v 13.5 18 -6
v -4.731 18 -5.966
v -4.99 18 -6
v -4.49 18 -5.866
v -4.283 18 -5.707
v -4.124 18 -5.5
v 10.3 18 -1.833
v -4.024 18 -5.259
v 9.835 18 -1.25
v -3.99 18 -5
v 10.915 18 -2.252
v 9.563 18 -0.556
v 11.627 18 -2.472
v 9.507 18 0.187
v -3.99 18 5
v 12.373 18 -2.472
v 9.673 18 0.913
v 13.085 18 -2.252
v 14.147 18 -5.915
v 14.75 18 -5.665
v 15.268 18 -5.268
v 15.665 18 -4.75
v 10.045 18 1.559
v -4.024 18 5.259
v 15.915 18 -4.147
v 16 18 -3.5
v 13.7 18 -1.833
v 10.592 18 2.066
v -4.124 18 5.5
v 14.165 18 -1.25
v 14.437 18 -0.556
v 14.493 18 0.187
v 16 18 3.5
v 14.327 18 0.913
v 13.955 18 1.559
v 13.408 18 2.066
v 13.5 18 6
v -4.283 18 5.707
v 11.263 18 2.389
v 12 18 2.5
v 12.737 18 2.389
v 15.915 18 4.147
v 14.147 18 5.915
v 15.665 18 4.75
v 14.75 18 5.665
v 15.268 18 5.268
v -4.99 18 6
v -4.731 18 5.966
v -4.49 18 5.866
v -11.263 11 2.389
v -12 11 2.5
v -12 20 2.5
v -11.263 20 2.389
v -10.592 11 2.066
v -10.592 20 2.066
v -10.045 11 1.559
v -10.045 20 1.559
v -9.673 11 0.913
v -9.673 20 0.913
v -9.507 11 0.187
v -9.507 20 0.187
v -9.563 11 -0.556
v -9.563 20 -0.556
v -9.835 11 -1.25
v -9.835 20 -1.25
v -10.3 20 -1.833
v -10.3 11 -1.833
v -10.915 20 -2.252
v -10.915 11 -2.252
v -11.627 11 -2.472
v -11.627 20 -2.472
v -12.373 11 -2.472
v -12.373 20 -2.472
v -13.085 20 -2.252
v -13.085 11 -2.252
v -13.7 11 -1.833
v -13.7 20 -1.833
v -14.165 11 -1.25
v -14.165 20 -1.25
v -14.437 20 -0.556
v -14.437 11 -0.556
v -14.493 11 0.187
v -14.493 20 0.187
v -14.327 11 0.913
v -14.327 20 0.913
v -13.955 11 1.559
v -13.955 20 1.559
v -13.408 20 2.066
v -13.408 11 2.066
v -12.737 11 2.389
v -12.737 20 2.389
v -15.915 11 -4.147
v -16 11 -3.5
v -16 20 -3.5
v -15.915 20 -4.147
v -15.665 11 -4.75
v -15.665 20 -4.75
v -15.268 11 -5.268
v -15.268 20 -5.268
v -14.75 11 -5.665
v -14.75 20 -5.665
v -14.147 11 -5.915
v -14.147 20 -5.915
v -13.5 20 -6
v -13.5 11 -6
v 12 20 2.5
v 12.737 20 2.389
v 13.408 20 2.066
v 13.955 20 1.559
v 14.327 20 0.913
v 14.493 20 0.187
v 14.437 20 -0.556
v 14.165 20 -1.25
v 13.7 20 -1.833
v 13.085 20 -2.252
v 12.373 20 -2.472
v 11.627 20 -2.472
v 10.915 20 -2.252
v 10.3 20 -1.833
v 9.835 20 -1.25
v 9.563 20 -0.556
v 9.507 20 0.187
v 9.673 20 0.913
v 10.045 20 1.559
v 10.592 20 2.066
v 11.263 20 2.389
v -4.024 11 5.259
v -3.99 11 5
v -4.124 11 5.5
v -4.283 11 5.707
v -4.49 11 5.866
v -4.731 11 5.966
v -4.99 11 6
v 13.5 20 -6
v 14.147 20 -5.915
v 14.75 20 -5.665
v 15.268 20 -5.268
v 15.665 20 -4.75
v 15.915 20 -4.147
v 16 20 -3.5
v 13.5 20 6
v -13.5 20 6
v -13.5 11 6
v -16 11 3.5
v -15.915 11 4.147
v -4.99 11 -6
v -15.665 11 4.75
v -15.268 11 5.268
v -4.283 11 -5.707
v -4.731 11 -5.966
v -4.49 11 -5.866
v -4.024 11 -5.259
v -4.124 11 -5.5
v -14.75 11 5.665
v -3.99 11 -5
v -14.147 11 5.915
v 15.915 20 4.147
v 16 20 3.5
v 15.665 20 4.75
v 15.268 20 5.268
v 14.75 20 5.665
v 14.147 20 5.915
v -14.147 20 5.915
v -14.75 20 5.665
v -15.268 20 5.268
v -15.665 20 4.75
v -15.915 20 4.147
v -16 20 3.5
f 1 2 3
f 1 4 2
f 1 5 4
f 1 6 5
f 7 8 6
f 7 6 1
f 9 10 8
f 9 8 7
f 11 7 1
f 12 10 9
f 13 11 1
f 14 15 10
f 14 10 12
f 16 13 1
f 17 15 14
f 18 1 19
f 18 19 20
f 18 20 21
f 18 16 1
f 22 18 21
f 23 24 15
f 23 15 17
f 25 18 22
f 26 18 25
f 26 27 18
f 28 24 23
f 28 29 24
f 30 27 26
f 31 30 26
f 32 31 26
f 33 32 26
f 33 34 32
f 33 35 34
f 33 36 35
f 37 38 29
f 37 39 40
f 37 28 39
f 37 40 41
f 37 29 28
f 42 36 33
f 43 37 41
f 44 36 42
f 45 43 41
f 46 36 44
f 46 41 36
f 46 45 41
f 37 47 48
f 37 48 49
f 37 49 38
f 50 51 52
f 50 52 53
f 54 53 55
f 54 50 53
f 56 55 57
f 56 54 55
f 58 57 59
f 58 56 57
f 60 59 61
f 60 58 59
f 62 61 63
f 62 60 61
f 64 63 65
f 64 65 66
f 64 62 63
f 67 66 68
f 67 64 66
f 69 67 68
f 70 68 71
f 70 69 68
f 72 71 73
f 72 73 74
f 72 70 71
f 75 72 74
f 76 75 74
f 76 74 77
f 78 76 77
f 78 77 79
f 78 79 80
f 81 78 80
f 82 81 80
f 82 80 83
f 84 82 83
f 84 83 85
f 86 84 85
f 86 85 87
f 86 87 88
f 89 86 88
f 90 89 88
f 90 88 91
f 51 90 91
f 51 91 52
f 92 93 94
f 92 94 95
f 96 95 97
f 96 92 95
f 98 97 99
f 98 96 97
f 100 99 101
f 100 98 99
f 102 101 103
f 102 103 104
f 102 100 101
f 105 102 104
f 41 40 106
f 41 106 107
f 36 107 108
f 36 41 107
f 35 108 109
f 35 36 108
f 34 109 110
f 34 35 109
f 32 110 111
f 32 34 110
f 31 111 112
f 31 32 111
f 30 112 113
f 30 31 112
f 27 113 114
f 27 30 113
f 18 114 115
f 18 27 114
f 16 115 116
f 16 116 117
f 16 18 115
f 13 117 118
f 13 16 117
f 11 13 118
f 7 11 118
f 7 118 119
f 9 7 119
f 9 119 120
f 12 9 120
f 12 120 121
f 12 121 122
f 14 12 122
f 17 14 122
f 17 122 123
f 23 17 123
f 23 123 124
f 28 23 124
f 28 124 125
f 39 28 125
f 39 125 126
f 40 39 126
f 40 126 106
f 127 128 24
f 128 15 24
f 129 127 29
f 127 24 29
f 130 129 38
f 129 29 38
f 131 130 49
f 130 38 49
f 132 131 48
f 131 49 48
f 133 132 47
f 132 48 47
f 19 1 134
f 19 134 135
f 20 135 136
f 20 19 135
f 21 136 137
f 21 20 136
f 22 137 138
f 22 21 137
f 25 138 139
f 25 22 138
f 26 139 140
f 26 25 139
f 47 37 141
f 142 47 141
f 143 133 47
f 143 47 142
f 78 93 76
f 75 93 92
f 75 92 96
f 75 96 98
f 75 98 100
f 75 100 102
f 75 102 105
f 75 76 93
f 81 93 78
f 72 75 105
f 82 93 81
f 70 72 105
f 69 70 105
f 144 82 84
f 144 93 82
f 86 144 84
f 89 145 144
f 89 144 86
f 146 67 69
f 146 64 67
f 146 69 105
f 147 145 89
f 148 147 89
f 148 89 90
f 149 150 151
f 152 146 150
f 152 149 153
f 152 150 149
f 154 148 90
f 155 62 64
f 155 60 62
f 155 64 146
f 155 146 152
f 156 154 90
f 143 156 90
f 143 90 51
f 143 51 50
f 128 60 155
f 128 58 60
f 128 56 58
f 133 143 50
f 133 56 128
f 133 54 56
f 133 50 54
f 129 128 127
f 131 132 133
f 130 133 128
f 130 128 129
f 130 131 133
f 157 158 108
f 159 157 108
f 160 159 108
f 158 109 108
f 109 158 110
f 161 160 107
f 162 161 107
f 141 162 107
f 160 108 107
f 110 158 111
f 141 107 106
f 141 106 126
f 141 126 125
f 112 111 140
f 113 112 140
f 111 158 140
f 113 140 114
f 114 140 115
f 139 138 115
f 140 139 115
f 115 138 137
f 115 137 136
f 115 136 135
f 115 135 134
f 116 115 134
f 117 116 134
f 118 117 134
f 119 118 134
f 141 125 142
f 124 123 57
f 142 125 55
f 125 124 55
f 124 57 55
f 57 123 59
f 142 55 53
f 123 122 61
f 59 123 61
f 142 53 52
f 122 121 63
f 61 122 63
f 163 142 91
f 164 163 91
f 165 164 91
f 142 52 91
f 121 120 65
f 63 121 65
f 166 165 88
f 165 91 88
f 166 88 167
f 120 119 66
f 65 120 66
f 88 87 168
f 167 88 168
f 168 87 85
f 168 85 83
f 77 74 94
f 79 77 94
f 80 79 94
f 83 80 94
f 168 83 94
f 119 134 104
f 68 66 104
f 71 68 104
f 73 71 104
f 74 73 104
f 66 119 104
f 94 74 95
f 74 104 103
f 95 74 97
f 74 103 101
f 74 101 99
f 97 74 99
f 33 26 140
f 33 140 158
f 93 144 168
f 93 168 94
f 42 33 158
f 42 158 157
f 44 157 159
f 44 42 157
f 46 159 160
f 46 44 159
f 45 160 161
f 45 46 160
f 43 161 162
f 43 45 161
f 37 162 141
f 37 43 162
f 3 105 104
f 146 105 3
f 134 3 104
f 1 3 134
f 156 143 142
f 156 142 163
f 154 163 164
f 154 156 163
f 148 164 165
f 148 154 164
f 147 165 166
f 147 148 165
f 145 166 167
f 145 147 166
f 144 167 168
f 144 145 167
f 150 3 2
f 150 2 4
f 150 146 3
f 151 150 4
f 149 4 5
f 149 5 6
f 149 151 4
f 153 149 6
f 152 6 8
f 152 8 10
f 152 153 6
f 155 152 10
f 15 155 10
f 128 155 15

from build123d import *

# Parameters (mm, degrees)
SKETCH_1_R          = 2.5
EXTRUDE_1_DEPTH     = 20
SKETCH_2_W          = 28.6658273
SKETCH_2_H          = 20.338801826
CUT_EXTRUDE_1_DEPTH = 18
SKETCH_3_W          = 21.28696294
SKETCH_3_H          = 15.18623143
CUT_EXTRUDE_2_DEPTH = 11
FILLET_1_R          = 1


with BuildPart() as part:
    # Эскиз1 → Бобышка-Вытянуть1 (new body)
    with BuildSketch(Plane(origin=(0, 0, 0), x_dir=(1, 0, 0), z_dir=(0, 1, 0))):
        with BuildLine():
            Line((-13.5, 6), (13.5, 6))
            ThreePointArc((13.5, 6), (15.267766953, 5.267766953), (16, 3.5))
            Line((16, 3.5), (16, -3.5))
            ThreePointArc((16, -3.5), (15.267766953, -5.267766953), (13.5, -6))
            Line((13.5, -6), (-13.5, -6))
            ThreePointArc((-13.5, -6), (-15.267766953, -5.267766953), (-16, -3.5))
            Line((-16, -3.5), (-16, 3.5))
            ThreePointArc((-16, 3.5), (-15.267766953, 5.267766953), (-13.5, 6))
        make_face()
        with Locations(Location((-12, 0, 0), (0, 0, 270))):
            Circle(SKETCH_1_R, mode=Mode.SUBTRACT)
        with Locations(Location((12, 0, 0), (0, 0, 270))):
            Circle(SKETCH_1_R, mode=Mode.SUBTRACT)
    extrude(amount=EXTRUDE_1_DEPTH)

    # Эскиз2 → Вырез-Вытянуть1 (cut)
    with BuildSketch(Plane.XZ):
        with Locations((10.342984763, 0)):
            Rectangle(SKETCH_2_W, SKETCH_2_H)
    extrude(amount=-CUT_EXTRUDE_1_DEPTH, mode=Mode.SUBTRACT)

    # Эскиз3 → Вырез-Вытянуть2 (cut)
    with BuildSketch(Plane.XZ):
        with Locations((-5.752302283, -0.036989119)):
            Rectangle(SKETCH_3_W, SKETCH_3_H)
    extrude(amount=-CUT_EXTRUDE_2_DEPTH, mode=Mode.SUBTRACT)

    # Скругление1
    fillet_1_edges = [part.edges().sort_by_distance(p)[0] for p in [
        (-3.989928887, 14.5, -6),
        (-3.989928887, 14.5, 6),
    ]]
    fillet(fillet_1_edges, radius=FILLET_1_R)


solid = part.part
